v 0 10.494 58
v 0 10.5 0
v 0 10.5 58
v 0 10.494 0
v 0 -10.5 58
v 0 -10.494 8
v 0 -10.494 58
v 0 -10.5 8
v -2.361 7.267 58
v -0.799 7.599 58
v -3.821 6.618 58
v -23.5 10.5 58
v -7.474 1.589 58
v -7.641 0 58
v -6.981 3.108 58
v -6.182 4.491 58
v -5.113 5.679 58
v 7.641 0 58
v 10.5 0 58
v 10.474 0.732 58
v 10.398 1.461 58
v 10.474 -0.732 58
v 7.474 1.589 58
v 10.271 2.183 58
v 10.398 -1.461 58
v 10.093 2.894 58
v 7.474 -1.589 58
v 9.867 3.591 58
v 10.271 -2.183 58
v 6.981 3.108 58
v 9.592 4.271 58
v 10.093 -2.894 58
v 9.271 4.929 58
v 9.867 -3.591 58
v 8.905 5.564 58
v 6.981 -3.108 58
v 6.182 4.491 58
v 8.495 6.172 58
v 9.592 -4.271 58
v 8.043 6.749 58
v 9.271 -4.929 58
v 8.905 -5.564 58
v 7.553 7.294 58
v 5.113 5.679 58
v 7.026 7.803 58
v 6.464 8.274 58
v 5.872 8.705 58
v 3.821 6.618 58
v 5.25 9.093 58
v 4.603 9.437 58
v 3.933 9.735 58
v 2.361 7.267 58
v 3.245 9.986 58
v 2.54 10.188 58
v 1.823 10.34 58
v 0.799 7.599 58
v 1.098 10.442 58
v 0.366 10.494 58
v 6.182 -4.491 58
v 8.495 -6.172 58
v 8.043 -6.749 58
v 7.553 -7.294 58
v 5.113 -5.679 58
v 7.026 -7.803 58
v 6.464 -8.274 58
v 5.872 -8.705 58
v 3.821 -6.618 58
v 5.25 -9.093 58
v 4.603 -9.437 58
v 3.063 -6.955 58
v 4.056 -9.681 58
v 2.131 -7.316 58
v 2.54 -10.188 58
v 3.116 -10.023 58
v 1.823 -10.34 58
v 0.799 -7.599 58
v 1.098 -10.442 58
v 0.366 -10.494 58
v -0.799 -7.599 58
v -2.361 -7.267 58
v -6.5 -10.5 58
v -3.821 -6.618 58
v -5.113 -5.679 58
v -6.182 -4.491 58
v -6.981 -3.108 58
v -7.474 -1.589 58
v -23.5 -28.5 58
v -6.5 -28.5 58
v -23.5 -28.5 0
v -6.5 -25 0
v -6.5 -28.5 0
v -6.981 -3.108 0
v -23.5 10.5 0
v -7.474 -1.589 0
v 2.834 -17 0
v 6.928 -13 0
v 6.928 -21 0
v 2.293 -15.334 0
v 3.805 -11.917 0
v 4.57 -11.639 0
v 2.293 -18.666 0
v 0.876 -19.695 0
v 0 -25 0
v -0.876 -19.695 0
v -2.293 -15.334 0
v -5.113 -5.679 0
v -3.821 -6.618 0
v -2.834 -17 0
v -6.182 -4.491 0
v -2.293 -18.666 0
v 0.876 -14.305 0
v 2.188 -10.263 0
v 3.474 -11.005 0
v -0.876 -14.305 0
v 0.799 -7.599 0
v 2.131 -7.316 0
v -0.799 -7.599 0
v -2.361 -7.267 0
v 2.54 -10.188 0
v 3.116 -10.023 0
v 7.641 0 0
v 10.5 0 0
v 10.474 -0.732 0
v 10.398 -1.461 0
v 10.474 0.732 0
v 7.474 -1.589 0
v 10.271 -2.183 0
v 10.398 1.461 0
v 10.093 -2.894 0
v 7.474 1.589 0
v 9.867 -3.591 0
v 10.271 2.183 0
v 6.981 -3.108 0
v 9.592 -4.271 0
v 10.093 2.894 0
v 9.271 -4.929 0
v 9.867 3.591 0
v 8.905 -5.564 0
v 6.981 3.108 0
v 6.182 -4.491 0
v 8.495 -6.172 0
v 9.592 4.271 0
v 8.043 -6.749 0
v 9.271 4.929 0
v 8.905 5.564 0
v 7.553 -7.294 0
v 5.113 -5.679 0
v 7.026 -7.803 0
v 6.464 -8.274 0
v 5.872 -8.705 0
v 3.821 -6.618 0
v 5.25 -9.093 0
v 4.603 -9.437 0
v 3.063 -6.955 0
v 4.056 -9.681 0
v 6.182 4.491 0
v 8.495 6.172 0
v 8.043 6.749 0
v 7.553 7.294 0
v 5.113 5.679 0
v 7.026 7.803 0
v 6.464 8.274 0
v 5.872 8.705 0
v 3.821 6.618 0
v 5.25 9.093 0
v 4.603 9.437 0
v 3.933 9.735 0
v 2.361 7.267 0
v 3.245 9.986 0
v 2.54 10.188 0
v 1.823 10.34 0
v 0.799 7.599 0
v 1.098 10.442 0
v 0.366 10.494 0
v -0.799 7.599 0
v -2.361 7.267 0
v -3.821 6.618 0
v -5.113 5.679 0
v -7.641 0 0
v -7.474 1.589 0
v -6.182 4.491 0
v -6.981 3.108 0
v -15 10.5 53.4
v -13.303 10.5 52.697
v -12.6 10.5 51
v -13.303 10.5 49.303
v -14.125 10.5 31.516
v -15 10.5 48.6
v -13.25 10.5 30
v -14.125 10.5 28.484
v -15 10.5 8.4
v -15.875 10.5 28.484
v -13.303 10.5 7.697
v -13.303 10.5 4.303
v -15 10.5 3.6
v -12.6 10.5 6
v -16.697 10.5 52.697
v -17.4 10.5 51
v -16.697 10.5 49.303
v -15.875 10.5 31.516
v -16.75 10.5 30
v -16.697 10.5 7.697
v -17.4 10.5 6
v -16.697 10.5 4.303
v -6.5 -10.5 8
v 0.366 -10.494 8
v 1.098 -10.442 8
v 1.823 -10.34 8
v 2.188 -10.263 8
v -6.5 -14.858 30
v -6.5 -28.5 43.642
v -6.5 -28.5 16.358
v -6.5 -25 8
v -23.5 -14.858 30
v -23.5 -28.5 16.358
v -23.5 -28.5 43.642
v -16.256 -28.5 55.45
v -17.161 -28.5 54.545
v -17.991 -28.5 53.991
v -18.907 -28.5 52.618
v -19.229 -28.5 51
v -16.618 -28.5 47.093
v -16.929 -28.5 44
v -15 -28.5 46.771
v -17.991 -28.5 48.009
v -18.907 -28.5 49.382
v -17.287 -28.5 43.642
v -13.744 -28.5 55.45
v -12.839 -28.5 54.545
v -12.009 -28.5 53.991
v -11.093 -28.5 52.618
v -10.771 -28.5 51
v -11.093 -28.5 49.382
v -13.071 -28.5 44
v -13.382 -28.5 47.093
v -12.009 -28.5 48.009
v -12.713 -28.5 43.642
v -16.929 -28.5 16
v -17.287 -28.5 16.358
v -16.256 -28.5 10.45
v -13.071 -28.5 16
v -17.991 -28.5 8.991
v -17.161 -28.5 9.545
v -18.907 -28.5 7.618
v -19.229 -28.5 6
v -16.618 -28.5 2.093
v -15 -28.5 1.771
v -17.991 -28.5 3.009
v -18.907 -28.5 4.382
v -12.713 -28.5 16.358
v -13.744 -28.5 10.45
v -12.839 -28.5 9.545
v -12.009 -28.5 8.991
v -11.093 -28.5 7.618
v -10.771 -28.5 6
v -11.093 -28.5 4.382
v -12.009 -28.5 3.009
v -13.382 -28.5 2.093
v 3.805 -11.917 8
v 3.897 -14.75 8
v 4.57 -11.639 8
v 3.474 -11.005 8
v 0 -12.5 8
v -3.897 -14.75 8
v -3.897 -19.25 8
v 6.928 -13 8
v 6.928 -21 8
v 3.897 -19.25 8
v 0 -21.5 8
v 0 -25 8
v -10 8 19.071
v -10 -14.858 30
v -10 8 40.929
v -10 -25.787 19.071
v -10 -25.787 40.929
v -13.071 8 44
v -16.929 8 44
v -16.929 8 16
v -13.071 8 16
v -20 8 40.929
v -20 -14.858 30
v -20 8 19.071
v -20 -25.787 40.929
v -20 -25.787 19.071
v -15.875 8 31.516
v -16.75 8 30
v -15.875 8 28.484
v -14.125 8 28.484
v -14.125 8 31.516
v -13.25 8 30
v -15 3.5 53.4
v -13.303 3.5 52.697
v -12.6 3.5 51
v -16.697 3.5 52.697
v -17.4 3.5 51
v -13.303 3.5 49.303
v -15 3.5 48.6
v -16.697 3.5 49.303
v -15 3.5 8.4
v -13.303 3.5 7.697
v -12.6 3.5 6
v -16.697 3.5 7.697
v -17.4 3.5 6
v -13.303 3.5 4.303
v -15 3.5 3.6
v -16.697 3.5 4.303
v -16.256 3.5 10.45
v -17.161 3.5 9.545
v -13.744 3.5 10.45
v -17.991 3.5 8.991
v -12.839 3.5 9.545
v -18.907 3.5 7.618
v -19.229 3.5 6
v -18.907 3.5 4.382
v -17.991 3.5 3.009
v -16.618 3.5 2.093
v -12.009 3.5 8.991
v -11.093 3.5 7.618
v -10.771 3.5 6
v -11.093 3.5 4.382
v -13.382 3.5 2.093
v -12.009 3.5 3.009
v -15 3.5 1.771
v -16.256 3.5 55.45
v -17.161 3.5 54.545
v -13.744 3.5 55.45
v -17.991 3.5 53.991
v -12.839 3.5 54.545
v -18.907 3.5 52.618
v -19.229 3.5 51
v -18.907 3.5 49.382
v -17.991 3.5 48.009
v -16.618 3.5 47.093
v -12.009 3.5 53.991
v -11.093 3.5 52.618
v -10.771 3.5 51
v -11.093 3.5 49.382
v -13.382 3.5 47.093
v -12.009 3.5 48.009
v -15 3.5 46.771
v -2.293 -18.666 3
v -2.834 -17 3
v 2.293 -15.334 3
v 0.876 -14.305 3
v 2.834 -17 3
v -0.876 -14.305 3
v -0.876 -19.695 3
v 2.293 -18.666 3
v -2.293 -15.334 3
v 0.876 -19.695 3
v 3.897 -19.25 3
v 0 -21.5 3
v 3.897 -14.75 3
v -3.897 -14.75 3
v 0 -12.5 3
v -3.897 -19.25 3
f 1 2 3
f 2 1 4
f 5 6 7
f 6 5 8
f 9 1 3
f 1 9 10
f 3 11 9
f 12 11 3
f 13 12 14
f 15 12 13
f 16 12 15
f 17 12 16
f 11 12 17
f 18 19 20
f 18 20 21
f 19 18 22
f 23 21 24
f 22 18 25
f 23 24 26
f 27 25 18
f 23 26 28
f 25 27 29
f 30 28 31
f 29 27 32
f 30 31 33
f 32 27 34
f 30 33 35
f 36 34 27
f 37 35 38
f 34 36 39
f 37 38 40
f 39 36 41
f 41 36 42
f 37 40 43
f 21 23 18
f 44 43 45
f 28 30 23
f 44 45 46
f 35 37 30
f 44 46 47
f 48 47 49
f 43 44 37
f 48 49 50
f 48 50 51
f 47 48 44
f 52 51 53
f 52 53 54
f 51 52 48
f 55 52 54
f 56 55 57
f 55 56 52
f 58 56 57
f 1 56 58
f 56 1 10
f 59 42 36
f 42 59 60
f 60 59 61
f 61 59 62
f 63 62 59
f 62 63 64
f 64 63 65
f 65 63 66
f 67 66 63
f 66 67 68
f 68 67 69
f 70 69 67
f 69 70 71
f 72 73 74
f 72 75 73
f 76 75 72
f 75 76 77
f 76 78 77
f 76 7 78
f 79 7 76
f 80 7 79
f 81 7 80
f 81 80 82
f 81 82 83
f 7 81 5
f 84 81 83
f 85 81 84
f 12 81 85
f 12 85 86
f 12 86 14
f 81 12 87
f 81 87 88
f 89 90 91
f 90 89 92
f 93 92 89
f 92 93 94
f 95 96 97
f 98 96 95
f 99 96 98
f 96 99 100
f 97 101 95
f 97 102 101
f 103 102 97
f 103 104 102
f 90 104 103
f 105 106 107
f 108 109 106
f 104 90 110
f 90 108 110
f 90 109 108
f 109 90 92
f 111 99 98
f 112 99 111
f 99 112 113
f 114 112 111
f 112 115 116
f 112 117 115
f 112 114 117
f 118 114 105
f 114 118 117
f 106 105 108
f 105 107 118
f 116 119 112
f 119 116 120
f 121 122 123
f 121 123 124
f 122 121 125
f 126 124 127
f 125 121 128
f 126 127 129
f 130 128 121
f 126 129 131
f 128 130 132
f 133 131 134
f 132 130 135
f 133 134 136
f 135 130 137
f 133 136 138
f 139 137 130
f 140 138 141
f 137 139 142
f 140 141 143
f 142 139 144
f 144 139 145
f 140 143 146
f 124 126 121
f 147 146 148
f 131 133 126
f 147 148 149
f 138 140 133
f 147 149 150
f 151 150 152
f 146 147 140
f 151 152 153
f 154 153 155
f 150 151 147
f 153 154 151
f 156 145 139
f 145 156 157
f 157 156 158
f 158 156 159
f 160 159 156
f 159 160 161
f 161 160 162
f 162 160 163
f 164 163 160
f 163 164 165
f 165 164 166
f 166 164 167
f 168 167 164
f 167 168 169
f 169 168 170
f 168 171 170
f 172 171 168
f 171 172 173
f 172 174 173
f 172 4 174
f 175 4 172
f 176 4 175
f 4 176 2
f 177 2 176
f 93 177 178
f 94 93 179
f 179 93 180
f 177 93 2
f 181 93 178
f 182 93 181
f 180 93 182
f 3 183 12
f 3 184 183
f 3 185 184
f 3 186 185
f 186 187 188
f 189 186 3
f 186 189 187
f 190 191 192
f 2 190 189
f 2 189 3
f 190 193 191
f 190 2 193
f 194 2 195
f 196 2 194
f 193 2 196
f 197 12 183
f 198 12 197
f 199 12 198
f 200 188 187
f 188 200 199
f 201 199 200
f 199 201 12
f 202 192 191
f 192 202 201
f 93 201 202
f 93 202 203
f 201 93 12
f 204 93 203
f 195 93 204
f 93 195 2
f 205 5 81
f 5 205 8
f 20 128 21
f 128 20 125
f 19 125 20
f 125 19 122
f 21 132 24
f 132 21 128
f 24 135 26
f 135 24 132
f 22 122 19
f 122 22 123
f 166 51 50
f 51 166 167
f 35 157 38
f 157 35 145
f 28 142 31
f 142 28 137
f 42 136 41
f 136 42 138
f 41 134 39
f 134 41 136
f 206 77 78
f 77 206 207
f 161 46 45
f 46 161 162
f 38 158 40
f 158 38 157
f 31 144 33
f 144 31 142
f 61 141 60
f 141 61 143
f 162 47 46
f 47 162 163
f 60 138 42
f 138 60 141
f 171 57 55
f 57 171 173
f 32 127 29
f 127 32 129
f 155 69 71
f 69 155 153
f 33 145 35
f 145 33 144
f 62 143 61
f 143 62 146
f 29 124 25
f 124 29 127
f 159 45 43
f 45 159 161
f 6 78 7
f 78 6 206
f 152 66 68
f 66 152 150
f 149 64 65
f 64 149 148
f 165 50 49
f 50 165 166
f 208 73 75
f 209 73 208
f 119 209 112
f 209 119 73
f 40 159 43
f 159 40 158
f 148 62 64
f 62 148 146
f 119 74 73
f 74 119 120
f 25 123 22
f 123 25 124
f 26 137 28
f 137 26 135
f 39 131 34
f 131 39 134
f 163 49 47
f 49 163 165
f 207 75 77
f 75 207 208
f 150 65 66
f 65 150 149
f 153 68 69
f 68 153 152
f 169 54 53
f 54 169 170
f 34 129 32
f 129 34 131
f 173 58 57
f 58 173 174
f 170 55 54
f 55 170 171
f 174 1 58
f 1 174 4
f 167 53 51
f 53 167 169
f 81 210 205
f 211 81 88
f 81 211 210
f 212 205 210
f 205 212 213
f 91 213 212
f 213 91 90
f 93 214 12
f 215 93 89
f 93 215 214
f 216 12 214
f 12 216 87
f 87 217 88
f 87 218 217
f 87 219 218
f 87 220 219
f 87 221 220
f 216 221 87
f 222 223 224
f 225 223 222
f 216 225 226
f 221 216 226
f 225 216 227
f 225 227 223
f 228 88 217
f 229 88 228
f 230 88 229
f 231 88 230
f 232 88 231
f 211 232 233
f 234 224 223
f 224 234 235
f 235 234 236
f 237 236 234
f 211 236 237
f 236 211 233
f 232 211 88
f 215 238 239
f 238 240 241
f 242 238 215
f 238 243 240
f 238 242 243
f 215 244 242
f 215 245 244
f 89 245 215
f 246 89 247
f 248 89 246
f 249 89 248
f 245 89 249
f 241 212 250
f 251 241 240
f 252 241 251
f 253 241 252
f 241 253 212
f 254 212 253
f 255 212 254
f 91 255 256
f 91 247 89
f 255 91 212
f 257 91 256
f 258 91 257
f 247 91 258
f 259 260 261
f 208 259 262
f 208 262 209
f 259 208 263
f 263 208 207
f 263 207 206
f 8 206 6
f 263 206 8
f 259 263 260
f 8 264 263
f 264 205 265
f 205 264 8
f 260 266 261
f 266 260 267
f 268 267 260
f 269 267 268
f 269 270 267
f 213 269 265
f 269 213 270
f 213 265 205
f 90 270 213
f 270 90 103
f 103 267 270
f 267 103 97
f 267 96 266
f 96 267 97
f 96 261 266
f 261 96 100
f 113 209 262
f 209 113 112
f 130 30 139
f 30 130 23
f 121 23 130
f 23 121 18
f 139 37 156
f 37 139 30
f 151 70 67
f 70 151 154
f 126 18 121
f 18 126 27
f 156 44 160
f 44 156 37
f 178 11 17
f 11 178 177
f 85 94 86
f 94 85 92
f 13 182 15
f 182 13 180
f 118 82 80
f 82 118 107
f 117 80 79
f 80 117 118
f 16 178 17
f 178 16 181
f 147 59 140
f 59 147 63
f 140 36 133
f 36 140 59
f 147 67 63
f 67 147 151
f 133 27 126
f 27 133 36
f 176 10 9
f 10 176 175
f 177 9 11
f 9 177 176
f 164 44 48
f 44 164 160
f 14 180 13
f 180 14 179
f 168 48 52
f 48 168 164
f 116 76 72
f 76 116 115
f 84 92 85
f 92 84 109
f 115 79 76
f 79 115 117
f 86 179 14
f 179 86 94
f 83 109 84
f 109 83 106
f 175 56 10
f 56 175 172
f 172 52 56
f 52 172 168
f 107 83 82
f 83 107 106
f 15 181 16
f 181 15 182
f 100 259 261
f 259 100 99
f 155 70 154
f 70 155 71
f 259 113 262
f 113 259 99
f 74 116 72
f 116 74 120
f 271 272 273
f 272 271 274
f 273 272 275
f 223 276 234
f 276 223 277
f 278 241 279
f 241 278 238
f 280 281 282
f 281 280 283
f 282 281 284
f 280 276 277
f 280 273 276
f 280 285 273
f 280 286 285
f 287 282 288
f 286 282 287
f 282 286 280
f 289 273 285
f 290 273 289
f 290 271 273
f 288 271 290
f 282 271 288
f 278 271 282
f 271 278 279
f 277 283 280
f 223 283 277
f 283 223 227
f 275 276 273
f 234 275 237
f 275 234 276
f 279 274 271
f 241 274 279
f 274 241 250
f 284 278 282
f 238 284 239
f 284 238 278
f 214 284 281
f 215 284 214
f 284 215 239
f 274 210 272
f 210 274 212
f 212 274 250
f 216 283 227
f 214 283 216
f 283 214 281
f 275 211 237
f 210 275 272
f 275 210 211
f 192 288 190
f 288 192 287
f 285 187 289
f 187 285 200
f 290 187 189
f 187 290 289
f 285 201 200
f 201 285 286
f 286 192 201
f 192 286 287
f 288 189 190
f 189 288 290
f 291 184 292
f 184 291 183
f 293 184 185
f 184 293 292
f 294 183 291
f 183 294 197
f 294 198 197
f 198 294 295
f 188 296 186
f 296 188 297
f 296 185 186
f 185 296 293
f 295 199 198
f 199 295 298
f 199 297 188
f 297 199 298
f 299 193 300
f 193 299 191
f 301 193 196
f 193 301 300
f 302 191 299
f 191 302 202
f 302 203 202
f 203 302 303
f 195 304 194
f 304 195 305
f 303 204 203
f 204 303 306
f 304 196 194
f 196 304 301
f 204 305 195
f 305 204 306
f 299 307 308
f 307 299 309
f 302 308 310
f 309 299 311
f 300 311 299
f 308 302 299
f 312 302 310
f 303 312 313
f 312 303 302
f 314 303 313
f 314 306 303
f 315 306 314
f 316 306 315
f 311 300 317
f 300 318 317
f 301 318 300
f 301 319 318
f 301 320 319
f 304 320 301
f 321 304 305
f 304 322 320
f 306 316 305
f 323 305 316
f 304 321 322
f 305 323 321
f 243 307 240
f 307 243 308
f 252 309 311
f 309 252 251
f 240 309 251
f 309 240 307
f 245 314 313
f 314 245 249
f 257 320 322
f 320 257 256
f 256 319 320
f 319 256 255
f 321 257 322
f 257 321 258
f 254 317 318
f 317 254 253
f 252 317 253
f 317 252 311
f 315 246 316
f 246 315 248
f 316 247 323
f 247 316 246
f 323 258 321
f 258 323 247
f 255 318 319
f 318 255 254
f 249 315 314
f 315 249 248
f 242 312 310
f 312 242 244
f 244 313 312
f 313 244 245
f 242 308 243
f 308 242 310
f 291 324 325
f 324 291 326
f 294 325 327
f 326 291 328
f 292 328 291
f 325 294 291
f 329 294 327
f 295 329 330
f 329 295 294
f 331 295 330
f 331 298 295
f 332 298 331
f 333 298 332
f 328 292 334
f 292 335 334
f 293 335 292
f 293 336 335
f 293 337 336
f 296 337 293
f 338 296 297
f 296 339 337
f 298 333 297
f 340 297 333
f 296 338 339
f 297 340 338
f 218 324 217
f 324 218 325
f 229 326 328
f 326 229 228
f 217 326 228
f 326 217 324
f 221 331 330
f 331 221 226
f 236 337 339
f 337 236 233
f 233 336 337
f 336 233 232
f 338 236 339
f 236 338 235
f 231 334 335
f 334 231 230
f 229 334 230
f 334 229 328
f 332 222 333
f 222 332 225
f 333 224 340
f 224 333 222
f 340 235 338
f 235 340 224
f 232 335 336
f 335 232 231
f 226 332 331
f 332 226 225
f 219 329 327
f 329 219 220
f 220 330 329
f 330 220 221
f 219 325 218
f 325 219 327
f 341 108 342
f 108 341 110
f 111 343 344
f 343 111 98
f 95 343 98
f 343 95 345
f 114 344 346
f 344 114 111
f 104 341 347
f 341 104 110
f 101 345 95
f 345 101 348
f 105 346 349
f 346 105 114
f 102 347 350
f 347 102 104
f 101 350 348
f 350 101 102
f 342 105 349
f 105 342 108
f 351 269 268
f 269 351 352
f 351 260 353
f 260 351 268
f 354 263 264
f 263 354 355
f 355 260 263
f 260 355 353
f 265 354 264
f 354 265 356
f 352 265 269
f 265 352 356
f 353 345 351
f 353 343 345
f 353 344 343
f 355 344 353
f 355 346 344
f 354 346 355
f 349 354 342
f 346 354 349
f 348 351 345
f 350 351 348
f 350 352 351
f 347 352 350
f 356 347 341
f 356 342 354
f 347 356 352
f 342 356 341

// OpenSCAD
// file: polyholes.scad
//
// Mendel90
//
// GNU GPL v2
// nop.head@gmail.com
// hydraraptor.blogspot.com
//
// See http://hydraraptor.blogspot.com/2011/02/polyholes.html
//
function sides(r) = max(round(4 *r),3);
function correctedRadius(r,n) = 0.1 + r / cos(180 / n);
function correctedDiameter(d) = 0.2 + d / cos(180 / sides(d / 2));

module polyCircle(r, center = false) {
    n = sides(r);
    circle(r = correctedRadius(r,n), $fn = n, center = center);
}

module poly_circle(r, center = false) {
	polyCircle(r, center);
}

module polyCylinder(r, h, center = false) {
    n = sides(r);
    cylinder(h = h, r = correctedRadius(r,n), $fn = n, center = center);
}

module poly_cylinder(r, h, center = false) {
	polyCylinder(r,h,center);
}

module polydCylinder(r, center = false) {
    n = sides(r);
    r = correctedRadius(r,n);
    cylinder(h = h, r = r, $fn = n, center = center);
    translate([0, -r, 0])
        cube([r, 2 * r, h]);
}

module poly_d_cylinder(r, center = false) {
	polydCylinder(r,center);
}
// file: bearing.scad
// PRUSA iteration3
// Bearing holders
// GNU GPL v3
// Josef Průša <iam@josefprusa.cz> and contributors
// http://www.reprap.org/wiki/Prusa_Mendel
// http://prusamendel.org

use <polyholes.scad>

bearing_diameter = 15;

module horizontal_bearing_base(bearings=1){
 translate(v=[0,0,6]) cube(size = [24,8+bearings*25,12], center = true);	
}
module horizontal_bearing_holes(bearings=1){
 cutter_lenght = 10+bearings*25;
 one_holder_lenght = 8+25;
 holder_lenght = 8+bearings*25;
 
 // Main bearing cut
 difference(){
  translate(v=[0,0,12]) rotate(a=[90,0,0]) translate(v=[0,0,-cutter_lenght/2]) cylinder(h = cutter_lenght, r=bearing_diameter/2, $fn=50);
  // Bearing retainers
  translate(v=[0,1-holder_lenght/2,3]) cube(size = [24,6,8], center = true);
  translate(v=[0,-1+holder_lenght/2,3]) cube(size = [24,6,8], center = true);
 }
 
 // Ziptie cutouts
 ziptie_cut_ofset = 0;
 for ( i = [0 : bearings-1] ){
  // For easier positioning I move them by half of one 
  // bearing holder then add each bearign lenght and then center again
  translate(v=[0,-holder_lenght/2,0]) translate(v=[0,one_holder_lenght/2+i*25,0]) difference(){
   union(){
    translate(v=[0,2-6,12]) rotate(a=[90,0,0]) translate(v=[0,0,0]) cylinder(h = 4, r=12.5, $fn=50);
    translate(v=[0,2+6,12]) rotate(a=[90,0,0]) translate(v=[0,0,0]) cylinder(h = 4, r=12.5, $fn=50);
   }
   translate(v=[0,10,12]) rotate(a=[90,0,0]) translate(v=[0,0,0]) cylinder(h = 24, r=10, $fn=50);
  }
 }
 
}

module horizontal_bearing_test(){
 difference(){
  horizontal_bearing_base(1);
  horizontal_bearing_holes(1);
 }
 translate(v=[30,0,0]) difference(){
  horizontal_bearing_base(2);
  horizontal_bearing_holes(2);
 }
 translate(v=[60,0,0]) difference(){
  horizontal_bearing_base(3);
  horizontal_bearing_holes(3);
 }
}



thinwall = 3;
bearing_size = bearing_diameter + 2 * thinwall;

module vertical_bearing_base(){
 translate(v=[-2-bearing_size/4,0,29]) cube(size = [4+bearing_size/2,bearing_size,58], center = true);
 cylinder(h = 58, r=bearing_size/2, $fn = 90);
}

module vertical_bearing_holes(){
  translate(v=[0,0,-1]) poly_cylinder(h = 62, r=bearing_diameter/2);
  rotate(a=[0,0,-70]) translate(v=[bearing_diameter/2-1,-0.5,-1]) cube(size = [thinwall*2,1,62]);

}

difference(){
vertical_bearing_base();
vertical_bearing_holes();
}
// main file
// PRUSA iteration3
// X end prototype
// GNU GPL v3
// Josef Průša <iam@josefprusa.cz> and contributors
// http://www.reprap.org/wiki/Prusa_Mendel
// http://prusamendel.org

use <bearing.scad>
use <polyholes.scad>
rod_distance = 45;

module x_end_base(){
// Main block
height = 58;
translate(v=[-15,-9,height/2]) cube(size = [17,39,height], center = true);
// Bearing holder
 vertical_bearing_base();	
//Nut trap
 // Cube
 translate(v=[-2-2,-17,4]) cube(size = [8,16,8], center = true);
 // Hexagon
 translate(v=[0,-17,0]) rotate([0,0,30]) cylinder(h = 8, r=8, $fn = 6);





}



module x_end_holes(){
 vertical_bearing_holes();
// Belt hole
translate(v=[-1,0,0]){
// Stress relief
//translate(v=[-5.5-10+1.5,-10-1,30]) cube(size = [20,1,28], center = true);
translate(v=[-15,-29,30]) rotate([45,0,0]) cube(size = [20,20,20], center = true);

translate(v=[-5.5-10+1.5,10,30])  rotate(a=[90,0,0]) cylinder(h=10, r=1.75, center = true);
translate(v=[-5.5-10+1.5,10,51])  rotate(a=[90,0,0]) cylinder(h=15, r=2.4, center = true);
translate(v=[-5.5-10+1.5,10,6])  rotate(a=[90,0,0]) cylinder(h=15, r=2.4, center = true);

difference(){
translate(v=[-5.5-10+1.5,-15,30]) cube(size = [10,46,28], center = true);
	

	

	// Nice edges

	translate(v=[-5.5-10+1.5,-10,30+23]) rotate([0,45,0]) cube(size = [10,46,28], center = true);
	translate(v=[-5.5-10+1.5,-10,30+23]) rotate([0,-45,0]) cube(size = [10,46,28], center = true);
	translate(v=[-5.5-10+1.5,-10,30-23]) rotate([0,45,0]) cube(size = [10,46,28], center = true);
	translate(v=[-5.5-10+1.5,-10,30-23]) rotate([0,-45,0]) cube(size = [10,46,28], center = true);

}
}

// Bottom pushfit rod
translate(v=[-15,-41.5,6]) rotate(a=[-90,0,0]) pushfit_rod(8.1,45);
// Top pushfit rod
translate(v=[-15,-41.5,rod_distance+6]) rotate(a=[-90,0,0]) pushfit_rod(8.1,45);
// Nut trap
 translate(v=[0,-17,-0.5]) poly_cylinder(h = 4, r=2.6, $fn=25);
 translate(v=[0,-17,3]) rotate([0,0,30]) cylinder(h = 10, r=4.5, $fn = 6);


}


// Final prototype
module x_end_plain(){
 difference(){
  x_end_base();
  x_end_holes();
 }
}

x_end_plain();


module pushfit_rod(diameter,length){
 poly_cylinder(h = length, r=diameter/2);
 difference(){
 	translate(v=[0,-diameter/2.85,length/2]) rotate([0,0,45]) cube(size = [diameter/2,diameter/2,length], center = true);
 	translate(v=[0,-diameter/4-diameter/2-0.4,length/2]) rotate([0,0,0]) cube(size = [diameter,diameter/2,length], center = true);
 }
 //translate(v=[0,-diameter/2-2,length/2]) cube(size = [diameter,1,length], center = true);
}
